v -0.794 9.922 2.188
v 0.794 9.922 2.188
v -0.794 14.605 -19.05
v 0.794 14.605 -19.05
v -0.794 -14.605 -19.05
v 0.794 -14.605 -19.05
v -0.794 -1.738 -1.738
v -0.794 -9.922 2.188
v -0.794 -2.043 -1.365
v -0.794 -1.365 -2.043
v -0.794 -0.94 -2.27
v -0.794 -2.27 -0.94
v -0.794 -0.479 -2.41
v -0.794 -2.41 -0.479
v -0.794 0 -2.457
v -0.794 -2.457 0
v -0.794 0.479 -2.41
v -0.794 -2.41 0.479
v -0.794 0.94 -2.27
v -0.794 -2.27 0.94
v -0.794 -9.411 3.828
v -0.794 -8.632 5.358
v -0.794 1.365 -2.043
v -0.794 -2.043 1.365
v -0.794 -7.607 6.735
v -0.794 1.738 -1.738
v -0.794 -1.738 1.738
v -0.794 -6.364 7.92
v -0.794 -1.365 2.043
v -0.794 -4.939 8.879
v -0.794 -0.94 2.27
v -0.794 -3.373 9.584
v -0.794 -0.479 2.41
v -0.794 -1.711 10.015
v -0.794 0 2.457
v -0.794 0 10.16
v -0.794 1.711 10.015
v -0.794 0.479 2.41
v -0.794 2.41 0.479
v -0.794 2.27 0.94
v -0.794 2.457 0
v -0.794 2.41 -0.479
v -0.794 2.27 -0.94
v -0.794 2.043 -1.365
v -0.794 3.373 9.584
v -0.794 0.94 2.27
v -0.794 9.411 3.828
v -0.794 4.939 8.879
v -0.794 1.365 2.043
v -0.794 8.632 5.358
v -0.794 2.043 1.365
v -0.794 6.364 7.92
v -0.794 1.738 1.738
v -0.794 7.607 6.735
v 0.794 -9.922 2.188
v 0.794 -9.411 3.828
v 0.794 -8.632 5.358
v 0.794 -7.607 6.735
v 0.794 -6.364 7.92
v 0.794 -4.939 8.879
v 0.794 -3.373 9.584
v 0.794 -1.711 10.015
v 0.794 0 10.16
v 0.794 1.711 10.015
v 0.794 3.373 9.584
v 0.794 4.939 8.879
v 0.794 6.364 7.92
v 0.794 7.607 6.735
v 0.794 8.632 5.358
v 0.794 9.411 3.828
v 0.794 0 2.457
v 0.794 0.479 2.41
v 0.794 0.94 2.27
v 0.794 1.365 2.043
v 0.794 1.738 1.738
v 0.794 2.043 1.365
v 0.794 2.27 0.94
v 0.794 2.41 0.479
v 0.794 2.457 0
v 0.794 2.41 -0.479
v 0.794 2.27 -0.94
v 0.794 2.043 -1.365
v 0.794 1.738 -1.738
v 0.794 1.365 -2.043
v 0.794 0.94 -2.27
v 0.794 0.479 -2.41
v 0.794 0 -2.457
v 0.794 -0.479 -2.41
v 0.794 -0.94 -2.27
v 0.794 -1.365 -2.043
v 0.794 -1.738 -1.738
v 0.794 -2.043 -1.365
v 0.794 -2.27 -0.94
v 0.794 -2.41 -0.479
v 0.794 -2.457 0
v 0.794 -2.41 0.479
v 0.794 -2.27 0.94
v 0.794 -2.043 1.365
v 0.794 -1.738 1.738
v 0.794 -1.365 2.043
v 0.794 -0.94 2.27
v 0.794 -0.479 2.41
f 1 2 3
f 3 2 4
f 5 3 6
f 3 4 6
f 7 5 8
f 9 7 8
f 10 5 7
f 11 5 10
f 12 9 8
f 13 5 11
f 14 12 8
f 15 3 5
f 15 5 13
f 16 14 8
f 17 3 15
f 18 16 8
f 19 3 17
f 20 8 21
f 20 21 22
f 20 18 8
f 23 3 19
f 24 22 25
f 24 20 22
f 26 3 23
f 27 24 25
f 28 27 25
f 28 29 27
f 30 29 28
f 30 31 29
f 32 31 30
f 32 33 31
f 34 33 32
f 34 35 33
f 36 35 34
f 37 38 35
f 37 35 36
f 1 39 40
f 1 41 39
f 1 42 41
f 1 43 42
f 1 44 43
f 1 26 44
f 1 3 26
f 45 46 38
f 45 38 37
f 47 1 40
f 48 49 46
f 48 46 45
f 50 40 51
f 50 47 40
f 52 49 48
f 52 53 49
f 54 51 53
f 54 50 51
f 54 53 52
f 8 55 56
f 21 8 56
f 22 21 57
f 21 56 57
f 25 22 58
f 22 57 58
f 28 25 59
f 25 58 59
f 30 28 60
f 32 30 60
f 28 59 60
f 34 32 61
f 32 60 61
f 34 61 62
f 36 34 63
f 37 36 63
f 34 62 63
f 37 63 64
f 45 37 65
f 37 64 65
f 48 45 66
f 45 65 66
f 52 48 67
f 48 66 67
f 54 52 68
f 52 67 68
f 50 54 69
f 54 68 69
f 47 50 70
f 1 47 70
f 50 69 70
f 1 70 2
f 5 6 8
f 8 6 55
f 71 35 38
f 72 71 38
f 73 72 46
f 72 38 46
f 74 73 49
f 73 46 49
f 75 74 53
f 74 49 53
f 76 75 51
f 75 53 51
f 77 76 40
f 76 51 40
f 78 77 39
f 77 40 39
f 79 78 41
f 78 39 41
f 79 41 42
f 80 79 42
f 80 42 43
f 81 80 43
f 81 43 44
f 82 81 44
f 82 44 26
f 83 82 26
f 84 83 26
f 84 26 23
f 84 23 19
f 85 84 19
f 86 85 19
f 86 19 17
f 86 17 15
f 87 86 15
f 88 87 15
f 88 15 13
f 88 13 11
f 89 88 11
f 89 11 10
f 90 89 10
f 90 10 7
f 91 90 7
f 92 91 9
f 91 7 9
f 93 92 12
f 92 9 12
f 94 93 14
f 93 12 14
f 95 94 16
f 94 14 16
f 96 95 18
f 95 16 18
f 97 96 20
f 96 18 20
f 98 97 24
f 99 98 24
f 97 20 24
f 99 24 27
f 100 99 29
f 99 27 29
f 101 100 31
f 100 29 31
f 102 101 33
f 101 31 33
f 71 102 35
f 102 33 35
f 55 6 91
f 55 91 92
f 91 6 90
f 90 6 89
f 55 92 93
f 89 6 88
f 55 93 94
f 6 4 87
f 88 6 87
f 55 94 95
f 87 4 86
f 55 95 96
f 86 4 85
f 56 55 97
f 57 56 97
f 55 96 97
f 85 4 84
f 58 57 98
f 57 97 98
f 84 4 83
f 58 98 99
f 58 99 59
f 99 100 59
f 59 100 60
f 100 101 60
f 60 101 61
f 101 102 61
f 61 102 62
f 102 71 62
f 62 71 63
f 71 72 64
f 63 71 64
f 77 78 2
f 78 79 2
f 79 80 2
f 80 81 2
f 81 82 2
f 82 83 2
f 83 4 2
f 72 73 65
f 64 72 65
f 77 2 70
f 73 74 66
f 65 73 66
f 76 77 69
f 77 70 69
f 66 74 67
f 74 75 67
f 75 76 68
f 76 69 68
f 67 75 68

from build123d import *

# Parameters (mm, degrees)
BOSS_EXTRUDE1_DEPTH   = 0.79375
F_8_CLEARANCE_HOLE1_D = 4.9149


with BuildPart() as part:
    # Sketch1 → Boss-Extrude1 (new, symmetric)
    with BuildSketch(Plane(origin=(0, 0, 0), x_dir=(0, 0, -1), z_dir=(1, 0, 0))):
        with BuildLine():
            Line((-2.187912376, 9.921624838), (19.05, 14.605))
            Line((19.05, 14.605), (19.05, -14.605))
            Line((19.05, -14.605), (-2.187912376, -9.921624838))
            ThreePointArc((-2.187912376, -9.921624838), (-10.16, 0), (-2.187912376, 9.921624838))
        make_face()
    extrude(amount=BOSS_EXTRUDE1_DEPTH, both=True)

    # #8 Clearance Hole1 (through all)
    with Locations(Plane(origin=(0.79375, 0, 0), x_dir=(0, 0, -1), z_dir=(1, 0, 0))):
        with Locations((0, 0)):
            Hole(F_8_CLEARANCE_HOLE1_D / 2)


solid = part.part
